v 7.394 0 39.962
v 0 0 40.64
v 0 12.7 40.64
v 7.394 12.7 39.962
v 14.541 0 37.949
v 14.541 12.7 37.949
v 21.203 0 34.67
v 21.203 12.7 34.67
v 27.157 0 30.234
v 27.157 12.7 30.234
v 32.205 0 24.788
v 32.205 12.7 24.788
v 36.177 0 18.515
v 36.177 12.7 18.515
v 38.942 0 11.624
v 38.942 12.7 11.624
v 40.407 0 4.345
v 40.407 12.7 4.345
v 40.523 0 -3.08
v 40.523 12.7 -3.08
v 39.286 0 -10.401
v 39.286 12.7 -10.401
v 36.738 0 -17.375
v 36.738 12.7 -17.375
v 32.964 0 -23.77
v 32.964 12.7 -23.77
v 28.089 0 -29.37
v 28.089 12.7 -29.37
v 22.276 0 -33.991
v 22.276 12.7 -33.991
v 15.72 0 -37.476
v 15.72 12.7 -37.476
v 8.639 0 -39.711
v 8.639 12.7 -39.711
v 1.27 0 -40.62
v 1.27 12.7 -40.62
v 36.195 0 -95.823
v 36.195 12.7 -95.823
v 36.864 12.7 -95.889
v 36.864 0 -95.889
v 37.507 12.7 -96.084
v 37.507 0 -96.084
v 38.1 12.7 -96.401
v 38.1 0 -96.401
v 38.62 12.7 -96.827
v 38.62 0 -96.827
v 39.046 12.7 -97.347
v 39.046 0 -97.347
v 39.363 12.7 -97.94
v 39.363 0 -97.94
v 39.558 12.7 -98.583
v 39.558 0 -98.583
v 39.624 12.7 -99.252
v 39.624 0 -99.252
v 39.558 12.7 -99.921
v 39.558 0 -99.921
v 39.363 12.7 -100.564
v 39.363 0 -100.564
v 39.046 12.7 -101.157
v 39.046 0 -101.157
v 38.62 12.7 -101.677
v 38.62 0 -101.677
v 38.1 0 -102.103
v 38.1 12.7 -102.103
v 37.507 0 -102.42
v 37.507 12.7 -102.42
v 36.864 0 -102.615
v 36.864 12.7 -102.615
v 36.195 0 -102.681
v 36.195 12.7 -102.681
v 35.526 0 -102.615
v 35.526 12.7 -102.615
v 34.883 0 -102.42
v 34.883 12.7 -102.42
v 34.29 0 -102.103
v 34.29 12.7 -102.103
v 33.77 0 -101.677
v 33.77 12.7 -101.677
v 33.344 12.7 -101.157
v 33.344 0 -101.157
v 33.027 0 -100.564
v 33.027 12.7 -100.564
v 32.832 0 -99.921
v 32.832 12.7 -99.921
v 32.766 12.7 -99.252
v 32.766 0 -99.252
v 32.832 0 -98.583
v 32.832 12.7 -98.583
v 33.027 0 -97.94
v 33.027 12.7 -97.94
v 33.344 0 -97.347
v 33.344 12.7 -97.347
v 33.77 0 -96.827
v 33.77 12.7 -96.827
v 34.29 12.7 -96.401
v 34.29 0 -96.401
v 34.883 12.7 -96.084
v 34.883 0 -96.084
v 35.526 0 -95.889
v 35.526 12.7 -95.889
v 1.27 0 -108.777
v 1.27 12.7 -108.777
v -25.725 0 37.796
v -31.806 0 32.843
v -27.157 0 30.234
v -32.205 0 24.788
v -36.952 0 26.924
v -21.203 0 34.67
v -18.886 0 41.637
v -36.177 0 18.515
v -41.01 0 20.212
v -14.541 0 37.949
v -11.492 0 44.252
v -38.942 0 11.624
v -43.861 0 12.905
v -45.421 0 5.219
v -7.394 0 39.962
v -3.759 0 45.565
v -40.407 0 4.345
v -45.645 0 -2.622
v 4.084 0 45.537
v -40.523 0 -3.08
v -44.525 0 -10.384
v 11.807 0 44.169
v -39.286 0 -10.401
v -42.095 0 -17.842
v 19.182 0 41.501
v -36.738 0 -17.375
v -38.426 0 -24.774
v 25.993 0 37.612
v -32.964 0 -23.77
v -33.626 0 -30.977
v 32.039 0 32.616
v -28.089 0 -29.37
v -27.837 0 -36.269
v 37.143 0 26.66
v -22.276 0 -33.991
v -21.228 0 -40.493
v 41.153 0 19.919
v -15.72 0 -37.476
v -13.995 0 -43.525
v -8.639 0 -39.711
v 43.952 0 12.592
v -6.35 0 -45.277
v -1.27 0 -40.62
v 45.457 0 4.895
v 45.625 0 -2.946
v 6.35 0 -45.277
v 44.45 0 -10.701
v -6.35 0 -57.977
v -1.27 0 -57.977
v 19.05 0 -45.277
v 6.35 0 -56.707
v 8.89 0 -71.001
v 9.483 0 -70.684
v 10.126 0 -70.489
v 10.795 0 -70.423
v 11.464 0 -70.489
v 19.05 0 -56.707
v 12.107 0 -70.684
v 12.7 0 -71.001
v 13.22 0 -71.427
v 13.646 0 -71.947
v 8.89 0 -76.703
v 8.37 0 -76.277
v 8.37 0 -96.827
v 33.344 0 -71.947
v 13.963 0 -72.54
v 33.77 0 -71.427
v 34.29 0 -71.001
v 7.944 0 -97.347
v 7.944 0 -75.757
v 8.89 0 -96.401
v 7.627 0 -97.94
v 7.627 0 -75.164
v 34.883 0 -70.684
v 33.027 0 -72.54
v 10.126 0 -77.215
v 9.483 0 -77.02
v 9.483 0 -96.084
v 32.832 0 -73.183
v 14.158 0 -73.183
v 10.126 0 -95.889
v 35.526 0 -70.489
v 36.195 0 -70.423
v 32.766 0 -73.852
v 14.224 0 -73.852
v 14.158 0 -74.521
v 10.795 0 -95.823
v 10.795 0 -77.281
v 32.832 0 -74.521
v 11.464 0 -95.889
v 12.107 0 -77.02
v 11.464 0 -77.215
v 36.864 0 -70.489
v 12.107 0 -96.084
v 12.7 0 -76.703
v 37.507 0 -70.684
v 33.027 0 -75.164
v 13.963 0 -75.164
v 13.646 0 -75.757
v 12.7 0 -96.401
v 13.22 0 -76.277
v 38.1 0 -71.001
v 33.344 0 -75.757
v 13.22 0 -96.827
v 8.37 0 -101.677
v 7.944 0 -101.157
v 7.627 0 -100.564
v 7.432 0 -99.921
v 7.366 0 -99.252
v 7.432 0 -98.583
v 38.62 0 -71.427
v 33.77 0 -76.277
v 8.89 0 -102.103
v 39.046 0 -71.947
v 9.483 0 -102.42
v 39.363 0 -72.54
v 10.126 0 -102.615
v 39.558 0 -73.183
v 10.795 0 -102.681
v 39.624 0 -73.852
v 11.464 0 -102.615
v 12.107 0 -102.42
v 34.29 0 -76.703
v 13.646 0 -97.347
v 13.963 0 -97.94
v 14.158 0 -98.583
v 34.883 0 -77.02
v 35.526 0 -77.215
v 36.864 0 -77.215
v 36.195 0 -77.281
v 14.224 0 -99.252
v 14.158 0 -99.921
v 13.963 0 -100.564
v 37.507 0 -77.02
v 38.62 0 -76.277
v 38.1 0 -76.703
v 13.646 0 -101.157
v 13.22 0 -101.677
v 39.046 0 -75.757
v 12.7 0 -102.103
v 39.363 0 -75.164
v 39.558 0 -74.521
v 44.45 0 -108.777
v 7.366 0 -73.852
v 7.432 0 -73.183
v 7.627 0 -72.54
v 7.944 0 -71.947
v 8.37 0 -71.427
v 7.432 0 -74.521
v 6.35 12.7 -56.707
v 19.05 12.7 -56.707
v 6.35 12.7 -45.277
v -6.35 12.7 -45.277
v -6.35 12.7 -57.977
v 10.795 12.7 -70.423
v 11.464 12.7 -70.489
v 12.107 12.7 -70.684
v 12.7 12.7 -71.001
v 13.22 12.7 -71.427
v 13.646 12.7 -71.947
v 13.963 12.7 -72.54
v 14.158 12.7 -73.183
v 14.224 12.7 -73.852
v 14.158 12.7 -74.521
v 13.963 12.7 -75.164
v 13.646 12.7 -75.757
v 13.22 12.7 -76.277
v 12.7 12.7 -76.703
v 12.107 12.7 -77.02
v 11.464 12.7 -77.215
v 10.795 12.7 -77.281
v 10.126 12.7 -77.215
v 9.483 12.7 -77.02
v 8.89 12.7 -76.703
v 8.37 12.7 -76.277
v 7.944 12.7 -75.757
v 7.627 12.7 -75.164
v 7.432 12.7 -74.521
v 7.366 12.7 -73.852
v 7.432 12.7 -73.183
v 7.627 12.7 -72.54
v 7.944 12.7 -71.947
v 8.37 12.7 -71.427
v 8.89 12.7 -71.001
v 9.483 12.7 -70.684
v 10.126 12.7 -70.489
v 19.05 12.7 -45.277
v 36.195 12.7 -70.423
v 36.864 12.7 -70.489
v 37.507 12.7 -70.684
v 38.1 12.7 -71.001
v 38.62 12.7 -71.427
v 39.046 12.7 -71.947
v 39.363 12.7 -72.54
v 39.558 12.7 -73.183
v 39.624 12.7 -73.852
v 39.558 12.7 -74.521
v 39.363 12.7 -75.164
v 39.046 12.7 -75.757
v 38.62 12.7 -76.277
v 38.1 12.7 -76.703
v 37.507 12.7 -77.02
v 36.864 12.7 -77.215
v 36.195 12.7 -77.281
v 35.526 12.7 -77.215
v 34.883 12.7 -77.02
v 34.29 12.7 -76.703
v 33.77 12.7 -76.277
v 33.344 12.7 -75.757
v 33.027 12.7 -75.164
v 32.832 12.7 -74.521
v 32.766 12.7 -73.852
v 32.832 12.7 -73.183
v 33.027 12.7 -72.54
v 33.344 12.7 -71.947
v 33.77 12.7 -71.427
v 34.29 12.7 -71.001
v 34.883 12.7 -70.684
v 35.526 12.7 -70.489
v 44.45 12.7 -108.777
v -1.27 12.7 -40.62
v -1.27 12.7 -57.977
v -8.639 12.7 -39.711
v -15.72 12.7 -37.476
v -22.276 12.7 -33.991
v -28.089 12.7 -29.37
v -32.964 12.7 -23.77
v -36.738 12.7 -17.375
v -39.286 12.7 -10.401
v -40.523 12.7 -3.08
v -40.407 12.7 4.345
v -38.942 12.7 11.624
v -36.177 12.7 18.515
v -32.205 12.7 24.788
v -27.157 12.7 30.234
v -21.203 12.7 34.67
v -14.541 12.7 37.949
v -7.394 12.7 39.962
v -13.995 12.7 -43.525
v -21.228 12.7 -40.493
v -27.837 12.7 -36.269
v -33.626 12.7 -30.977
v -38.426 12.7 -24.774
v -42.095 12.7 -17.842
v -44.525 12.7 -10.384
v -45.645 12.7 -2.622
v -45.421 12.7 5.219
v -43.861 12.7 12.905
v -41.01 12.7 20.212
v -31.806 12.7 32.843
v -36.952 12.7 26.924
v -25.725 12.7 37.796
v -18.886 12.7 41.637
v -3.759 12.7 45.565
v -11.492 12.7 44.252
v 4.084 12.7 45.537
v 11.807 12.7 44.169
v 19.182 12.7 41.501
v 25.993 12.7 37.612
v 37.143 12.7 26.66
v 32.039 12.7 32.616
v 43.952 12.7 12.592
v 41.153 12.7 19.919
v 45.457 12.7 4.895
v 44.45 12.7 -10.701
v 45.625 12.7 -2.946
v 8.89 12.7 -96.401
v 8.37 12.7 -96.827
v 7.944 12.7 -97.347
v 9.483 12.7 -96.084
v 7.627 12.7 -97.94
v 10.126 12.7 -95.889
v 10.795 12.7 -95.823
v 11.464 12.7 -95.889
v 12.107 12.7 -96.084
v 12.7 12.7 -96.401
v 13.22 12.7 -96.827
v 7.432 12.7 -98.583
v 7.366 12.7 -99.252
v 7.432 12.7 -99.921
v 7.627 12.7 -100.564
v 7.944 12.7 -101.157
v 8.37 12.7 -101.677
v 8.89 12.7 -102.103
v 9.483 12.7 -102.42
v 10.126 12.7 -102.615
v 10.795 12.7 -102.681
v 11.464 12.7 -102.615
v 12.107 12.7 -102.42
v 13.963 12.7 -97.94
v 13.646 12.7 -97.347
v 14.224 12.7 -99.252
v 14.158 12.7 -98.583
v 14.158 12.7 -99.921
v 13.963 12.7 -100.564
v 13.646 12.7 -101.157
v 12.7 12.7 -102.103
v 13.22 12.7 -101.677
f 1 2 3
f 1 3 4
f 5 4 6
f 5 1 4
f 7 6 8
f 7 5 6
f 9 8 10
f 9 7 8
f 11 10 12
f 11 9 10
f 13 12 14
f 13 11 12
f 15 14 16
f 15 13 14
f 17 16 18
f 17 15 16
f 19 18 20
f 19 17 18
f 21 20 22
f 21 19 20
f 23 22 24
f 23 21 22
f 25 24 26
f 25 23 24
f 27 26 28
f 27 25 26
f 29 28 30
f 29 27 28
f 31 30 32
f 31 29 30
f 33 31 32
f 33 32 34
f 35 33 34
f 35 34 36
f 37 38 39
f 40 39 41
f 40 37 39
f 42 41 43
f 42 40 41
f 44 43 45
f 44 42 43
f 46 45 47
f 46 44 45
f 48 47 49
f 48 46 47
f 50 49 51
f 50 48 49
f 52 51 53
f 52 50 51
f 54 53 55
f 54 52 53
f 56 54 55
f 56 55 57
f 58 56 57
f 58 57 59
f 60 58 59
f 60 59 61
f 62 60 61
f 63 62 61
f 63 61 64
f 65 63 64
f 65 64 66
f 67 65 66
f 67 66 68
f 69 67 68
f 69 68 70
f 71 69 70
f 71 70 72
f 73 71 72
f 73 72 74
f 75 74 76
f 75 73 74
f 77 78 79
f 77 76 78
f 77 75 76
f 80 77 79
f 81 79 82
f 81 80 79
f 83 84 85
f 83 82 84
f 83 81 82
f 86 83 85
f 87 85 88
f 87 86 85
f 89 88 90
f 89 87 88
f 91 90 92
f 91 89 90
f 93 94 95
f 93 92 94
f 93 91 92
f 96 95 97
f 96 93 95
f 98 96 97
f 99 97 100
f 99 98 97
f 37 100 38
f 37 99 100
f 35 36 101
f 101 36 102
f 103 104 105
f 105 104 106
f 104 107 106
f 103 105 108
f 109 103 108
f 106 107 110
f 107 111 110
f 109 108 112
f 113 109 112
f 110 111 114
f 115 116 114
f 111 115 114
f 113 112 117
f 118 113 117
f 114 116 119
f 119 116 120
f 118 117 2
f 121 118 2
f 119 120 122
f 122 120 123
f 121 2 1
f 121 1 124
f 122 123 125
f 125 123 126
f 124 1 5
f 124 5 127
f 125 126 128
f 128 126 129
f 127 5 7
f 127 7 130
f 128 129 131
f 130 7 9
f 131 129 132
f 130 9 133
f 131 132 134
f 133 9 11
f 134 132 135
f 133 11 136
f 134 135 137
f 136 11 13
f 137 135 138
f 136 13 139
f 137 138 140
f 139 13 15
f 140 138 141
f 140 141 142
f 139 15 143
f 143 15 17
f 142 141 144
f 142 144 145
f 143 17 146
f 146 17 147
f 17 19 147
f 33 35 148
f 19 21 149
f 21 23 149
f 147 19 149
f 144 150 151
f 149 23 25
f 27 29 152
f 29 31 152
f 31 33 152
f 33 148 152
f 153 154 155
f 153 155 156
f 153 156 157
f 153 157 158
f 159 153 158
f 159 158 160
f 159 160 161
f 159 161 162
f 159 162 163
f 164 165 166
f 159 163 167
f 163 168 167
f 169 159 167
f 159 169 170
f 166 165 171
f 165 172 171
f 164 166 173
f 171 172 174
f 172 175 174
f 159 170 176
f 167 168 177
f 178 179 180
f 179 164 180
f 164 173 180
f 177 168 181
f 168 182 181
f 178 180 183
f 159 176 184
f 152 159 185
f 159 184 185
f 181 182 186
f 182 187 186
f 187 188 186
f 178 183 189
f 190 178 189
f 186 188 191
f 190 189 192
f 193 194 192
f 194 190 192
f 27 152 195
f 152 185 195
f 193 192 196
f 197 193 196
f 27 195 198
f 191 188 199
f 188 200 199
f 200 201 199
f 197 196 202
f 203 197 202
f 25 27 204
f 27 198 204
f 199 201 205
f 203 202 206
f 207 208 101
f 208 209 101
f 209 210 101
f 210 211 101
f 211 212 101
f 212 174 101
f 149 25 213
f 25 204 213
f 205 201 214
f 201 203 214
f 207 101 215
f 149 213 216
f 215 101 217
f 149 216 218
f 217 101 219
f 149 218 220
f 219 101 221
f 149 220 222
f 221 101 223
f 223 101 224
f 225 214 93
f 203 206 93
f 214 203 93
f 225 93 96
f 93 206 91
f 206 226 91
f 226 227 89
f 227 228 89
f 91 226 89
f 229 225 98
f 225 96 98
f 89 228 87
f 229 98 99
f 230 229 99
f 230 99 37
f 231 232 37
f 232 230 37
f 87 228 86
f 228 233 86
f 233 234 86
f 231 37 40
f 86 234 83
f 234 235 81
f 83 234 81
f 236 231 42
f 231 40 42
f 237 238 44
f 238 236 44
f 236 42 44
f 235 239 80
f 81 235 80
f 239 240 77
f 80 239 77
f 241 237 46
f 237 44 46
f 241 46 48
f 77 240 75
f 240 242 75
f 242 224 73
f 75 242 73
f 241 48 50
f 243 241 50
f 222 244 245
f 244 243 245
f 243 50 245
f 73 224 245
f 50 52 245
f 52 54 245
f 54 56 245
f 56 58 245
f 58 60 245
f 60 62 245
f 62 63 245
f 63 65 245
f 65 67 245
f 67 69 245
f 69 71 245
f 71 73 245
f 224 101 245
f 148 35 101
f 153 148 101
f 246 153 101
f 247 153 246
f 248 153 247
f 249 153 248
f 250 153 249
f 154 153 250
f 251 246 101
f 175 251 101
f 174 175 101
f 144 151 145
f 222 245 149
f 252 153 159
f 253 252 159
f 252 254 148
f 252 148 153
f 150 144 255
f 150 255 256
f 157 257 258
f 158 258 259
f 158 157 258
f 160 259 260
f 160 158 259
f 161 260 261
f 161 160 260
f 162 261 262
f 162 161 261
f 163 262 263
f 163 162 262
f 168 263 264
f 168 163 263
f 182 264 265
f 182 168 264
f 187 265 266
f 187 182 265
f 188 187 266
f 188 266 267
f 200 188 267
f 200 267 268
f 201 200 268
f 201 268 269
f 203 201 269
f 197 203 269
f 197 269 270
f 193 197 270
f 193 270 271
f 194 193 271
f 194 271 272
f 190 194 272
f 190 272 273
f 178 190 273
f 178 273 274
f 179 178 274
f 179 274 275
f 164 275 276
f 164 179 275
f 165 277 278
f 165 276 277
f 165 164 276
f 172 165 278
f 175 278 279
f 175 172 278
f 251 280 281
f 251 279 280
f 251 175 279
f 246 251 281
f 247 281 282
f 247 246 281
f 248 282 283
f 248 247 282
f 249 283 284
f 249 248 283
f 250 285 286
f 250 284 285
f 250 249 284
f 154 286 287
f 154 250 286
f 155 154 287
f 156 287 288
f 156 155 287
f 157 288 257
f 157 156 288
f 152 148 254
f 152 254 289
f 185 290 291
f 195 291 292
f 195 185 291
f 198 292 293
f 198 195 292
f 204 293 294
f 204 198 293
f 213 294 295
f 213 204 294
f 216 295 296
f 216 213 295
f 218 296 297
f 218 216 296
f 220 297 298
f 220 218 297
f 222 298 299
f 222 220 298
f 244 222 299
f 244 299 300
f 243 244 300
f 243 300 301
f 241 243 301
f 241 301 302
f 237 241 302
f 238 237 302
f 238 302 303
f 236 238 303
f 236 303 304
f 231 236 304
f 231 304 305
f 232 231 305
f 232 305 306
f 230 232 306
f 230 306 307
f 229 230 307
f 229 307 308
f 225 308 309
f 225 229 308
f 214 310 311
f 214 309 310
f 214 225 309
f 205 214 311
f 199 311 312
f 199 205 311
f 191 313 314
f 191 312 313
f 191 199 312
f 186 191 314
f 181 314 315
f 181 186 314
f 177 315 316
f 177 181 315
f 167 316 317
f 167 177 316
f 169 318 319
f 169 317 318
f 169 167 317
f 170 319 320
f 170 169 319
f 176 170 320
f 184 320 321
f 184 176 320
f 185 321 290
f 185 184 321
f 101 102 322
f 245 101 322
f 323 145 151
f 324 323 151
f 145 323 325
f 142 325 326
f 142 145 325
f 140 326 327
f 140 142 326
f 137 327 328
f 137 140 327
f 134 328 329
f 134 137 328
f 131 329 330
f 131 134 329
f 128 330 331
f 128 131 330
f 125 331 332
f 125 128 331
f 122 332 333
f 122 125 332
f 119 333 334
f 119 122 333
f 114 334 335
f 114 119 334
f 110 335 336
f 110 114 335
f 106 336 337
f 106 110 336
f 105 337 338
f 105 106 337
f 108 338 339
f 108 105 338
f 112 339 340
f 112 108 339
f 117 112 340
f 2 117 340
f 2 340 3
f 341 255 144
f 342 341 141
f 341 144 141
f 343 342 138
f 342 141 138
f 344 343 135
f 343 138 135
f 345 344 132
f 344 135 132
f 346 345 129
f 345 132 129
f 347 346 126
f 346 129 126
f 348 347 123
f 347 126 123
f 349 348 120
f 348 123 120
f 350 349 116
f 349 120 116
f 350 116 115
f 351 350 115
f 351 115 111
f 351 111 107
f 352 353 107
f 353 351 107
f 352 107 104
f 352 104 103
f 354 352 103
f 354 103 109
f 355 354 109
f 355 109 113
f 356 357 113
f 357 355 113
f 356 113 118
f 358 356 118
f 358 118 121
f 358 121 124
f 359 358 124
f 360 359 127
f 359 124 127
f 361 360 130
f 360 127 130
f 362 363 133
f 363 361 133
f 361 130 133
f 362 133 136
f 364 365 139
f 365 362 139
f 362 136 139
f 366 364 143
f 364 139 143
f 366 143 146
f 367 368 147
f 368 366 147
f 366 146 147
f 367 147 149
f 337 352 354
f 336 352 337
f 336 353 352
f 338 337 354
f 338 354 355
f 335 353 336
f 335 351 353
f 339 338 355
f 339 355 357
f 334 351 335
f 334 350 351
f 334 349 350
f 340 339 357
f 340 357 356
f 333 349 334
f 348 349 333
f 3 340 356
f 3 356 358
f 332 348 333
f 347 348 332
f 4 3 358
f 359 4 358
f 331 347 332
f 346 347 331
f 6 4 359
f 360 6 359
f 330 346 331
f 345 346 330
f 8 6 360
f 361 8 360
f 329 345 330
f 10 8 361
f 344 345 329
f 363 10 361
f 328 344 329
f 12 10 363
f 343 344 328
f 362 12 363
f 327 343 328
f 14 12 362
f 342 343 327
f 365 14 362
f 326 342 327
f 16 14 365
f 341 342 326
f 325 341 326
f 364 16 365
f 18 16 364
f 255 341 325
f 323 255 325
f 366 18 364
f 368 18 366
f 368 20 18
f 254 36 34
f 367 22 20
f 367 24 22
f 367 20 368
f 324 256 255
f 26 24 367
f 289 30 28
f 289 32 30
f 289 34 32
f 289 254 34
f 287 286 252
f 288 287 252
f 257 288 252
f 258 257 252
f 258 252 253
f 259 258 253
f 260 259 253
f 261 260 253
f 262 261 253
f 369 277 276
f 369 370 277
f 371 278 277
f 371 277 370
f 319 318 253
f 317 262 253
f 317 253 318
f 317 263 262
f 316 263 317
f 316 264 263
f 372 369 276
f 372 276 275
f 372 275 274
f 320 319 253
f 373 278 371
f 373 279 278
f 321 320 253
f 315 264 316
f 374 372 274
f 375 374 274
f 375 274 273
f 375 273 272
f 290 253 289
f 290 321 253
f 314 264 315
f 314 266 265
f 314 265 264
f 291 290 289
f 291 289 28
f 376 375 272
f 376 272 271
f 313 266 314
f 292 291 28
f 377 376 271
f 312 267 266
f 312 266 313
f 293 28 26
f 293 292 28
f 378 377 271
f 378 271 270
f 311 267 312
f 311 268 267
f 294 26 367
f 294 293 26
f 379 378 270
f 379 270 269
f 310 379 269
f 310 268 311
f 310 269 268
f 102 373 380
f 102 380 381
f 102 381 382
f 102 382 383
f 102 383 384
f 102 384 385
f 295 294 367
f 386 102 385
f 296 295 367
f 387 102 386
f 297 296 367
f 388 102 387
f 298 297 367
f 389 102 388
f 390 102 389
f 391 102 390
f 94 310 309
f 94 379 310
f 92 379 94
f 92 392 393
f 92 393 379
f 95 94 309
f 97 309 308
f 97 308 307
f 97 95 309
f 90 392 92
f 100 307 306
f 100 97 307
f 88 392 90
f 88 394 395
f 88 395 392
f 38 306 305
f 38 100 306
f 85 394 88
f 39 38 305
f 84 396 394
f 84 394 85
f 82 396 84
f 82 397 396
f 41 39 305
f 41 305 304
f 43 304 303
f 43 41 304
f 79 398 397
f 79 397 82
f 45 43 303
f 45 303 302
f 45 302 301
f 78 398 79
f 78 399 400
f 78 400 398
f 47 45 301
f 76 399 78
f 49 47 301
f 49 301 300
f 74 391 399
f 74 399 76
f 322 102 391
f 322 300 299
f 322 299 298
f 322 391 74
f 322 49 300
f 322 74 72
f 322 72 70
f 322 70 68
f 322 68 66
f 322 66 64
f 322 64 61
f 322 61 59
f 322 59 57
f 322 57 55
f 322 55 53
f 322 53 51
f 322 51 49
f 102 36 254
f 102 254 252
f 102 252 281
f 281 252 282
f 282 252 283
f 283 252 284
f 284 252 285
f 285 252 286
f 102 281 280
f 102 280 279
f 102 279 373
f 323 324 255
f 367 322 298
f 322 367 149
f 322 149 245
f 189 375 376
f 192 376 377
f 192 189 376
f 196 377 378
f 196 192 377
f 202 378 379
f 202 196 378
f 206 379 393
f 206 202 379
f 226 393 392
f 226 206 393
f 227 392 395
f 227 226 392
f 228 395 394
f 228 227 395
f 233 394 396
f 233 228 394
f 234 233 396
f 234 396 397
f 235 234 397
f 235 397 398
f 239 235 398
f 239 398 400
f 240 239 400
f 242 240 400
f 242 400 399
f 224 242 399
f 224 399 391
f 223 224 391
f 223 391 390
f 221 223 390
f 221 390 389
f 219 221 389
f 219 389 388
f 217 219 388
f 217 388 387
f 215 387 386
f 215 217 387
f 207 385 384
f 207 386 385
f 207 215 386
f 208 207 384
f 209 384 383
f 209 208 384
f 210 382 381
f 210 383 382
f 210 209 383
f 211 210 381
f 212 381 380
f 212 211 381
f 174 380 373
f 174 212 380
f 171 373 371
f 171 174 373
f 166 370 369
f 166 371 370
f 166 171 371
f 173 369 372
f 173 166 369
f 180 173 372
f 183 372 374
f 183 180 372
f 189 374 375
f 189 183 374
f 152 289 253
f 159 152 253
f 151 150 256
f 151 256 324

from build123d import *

# Parameters (mm, degrees)
SKETCH1_R           = 45.72
SKETCH1_R_2         = 40.64
BOSS_EXTRUDE1_DEPTH = 12.7
SKETCH2_W           = 12.7
SKETCH2_H           = 12.7
BOSS_EXTRUDE2_DEPTH = 12.7
SKETCH4_W           = 2.54
SKETCH4_H           = 20.630054542
CUT_EXTRUDE2_DEPTH  = 75.919470517
BOSS_EXTRUDE3_REACH = 119.055
BOSS_EXTRUDE3_START = 38.1
SKETCH5_W           = 57.976880414
SKETCH5_H           = 12.7
SKETCH6_W           = 43.18
SKETCH6_H           = 50.8
BOSS_EXTRUDE4_DEPTH = 12.7
SKETCH7_R           = 3.429
SKETCH7_W           = 12.7
SKETCH7_H           = 11.43
CUT_EXTRUDE3_DEPTH  = 119.676105904


with BuildPart() as part:
    # Sketch1 → Boss-Extrude1 (new body)
    with BuildSketch(Plane(origin=(0, 0, 0), x_dir=(1, 0, 0), z_dir=(0, 1, 0))):
        with Locations(Location((0, 0, 0), (0, 0, 270))):
            Circle(SKETCH1_R)
        with Locations(Location((0, 0, 0), (0, 0, 270))):
            Circle(SKETCH1_R_2, mode=Mode.SUBTRACT)
    extrude(amount=BOSS_EXTRUDE1_DEPTH)

    # Sketch2 → Boss-Extrude2 (add)
    with BuildSketch(Plane(origin=(0, 0, 0), x_dir=(1, 0, 0), z_dir=(0, 1, 0))):
        with Locations((0, 51.626880414)):
            Rectangle(SKETCH2_W, SKETCH2_H)
    extrude(amount=BOSS_EXTRUDE2_DEPTH)

    # Sketch4 → Cut-Extrude2 (cut, through all)
    with BuildSketch(Plane(origin=(0, 0, 0), x_dir=(1, 0, 0), z_dir=(0, 1, 0))):
        with Locations((0, 50.104960897)):
            Rectangle(SKETCH4_W, SKETCH4_H)
    extrude(amount=CUT_EXTRUDE2_DEPTH, mode=Mode.SUBTRACT)

    # Sketch5 → Boss-Extrude3 (add, up to next)
    with BuildSketch(Plane(origin=(6.35, 0, 0), x_dir=(0, 0, -1), z_dir=(1, 0, 0)).offset(BOSS_EXTRUDE3_START), mode=Mode.PRIVATE) as boss_extrude3_sk1:
        with Locations((28.988440207, 6.35)):
            Rectangle(SKETCH5_W, SKETCH5_H)
    boss_extrude3_tool1 = extrude(boss_extrude3_sk1.sketch, amount=-BOSS_EXTRUDE3_REACH, mode=Mode.PRIVATE) - part.part
    add(boss_extrude3_tool1.solids().sort_by_distance((44.45, 6.35, -28.98844))[0])

    # Sketch6 → Boss-Extrude4 (add)
    with BuildSketch(Plane(origin=(0, 12.7, 0), x_dir=(1, 0, 0), z_dir=(0, 1, 0))):
        with Locations((22.86, 83.376880414)):
            Rectangle(SKETCH6_W, SKETCH6_H)
    extrude(amount=-BOSS_EXTRUDE4_DEPTH)

    # Sketch7 → Cut-Extrude3 (cut, through all)
    with BuildSketch(Plane(origin=(0, 0, 0), x_dir=(1, 0, 0), z_dir=(0, 1, 0))):
        with Locations(Location((10.795, 99.251880414, 0), (0, 0, 270))):
            Circle(SKETCH7_R)
        with Locations(Location((36.195, 99.251880414, 0), (0, 0, 270))):
            Circle(SKETCH7_R)
        with Locations(Location((36.195, 73.851880414, 0), (0, 0, 270))):
            Circle(SKETCH7_R)
        with Locations(Location((10.795, 73.851880414, 0), (0, 0, 270))):
            Circle(SKETCH7_R)
        with Locations((12.7, 50.991880414)):
            Rectangle(SKETCH7_W, SKETCH7_H)
    extrude(amount=CUT_EXTRUDE3_DEPTH, mode=Mode.SUBTRACT)


solid = part.part
